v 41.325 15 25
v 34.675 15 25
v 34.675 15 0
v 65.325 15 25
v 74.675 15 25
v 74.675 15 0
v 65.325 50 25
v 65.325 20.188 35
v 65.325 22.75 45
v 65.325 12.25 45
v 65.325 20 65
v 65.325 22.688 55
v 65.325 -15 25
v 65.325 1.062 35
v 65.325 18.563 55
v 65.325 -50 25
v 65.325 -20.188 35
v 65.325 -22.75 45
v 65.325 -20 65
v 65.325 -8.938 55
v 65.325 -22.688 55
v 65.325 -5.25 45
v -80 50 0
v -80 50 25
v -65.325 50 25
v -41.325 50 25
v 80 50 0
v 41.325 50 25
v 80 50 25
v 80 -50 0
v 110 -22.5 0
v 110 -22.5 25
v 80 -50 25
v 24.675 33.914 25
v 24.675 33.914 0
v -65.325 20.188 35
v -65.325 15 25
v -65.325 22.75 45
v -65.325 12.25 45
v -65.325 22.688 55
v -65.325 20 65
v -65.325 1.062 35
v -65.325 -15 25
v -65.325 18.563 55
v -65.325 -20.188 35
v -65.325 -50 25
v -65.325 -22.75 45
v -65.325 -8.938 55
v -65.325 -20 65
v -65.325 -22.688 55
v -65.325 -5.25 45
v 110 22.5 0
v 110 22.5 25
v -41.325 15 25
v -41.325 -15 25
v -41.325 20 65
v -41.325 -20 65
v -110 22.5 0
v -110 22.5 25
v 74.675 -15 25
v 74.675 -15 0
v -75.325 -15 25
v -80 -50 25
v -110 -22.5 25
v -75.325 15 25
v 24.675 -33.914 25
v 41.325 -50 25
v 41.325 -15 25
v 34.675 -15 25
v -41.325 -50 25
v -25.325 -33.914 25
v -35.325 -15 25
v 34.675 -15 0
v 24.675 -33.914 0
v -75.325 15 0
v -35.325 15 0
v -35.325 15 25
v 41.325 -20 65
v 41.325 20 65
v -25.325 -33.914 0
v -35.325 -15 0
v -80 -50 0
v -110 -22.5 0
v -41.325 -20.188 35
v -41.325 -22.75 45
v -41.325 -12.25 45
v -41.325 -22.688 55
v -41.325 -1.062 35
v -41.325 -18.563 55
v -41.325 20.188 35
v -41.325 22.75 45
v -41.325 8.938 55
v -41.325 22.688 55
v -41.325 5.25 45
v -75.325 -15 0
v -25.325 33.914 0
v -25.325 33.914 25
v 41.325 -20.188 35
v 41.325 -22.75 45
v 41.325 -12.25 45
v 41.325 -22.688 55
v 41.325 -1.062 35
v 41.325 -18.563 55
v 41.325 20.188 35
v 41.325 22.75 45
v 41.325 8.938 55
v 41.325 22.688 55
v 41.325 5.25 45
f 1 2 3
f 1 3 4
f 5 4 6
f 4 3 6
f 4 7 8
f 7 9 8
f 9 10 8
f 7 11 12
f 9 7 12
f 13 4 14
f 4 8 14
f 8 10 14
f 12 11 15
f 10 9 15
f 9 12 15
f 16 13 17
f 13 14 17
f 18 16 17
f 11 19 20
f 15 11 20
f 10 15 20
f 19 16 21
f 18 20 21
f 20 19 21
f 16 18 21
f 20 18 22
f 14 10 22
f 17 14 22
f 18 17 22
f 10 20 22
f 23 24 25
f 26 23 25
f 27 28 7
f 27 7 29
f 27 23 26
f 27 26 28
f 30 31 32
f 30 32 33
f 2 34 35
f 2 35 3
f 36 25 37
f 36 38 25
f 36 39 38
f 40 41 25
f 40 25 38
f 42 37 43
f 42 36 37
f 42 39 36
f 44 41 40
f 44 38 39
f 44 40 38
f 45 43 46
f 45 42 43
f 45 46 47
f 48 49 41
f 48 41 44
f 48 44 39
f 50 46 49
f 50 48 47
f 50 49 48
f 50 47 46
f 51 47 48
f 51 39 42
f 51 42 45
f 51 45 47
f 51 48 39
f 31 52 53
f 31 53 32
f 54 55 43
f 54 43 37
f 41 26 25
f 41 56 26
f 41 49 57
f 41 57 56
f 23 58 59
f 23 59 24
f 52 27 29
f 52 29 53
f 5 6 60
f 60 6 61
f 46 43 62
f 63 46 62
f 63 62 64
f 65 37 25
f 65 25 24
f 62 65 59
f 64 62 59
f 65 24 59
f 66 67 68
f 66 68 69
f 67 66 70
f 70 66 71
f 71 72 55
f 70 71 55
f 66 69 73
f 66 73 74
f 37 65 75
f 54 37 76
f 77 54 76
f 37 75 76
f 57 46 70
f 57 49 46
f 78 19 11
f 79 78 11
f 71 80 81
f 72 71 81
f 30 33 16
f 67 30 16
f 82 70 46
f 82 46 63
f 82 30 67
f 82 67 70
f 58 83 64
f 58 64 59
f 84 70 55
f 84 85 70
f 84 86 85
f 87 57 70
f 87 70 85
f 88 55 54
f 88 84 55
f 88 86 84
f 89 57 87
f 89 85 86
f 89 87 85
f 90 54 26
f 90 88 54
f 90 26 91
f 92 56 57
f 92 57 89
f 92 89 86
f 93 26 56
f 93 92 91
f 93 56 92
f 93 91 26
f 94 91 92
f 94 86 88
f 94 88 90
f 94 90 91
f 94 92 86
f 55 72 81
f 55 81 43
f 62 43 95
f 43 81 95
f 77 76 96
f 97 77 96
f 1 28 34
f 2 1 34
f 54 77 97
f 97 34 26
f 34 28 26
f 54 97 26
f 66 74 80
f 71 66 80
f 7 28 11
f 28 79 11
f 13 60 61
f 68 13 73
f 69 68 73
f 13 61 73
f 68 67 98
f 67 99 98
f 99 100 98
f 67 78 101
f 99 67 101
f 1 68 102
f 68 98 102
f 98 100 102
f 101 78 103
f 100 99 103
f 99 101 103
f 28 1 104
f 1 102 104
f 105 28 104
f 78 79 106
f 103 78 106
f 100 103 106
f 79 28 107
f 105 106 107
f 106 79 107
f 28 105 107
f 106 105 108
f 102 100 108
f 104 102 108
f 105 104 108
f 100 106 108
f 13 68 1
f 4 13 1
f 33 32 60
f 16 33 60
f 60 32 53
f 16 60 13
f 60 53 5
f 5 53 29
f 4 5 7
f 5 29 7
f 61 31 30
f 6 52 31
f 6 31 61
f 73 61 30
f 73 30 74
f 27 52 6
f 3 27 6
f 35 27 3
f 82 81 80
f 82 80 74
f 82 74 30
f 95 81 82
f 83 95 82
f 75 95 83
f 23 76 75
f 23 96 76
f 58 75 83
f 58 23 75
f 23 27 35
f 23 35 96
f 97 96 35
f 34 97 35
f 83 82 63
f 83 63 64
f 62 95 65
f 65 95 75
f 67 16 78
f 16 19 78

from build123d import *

# Parameters (mm, degrees)
EXTRUDE1_DEPTH = 25


with BuildPart() as part:
    # Sketch1 → Extrude1 (new body)
    with BuildSketch(Plane.XY):
        Polygon((110, 22.5), (110, -22.5), (80, -50), (-80, -50), (-110, -22.5), (-110, 22.5), (-80, 50), (80, 50), align=None)
        Polygon((-75.325078699, 15), (-35.325078699, 15), (-25.325078699, 33.914218403), (24.674921301, 33.914218403), (34.674921301, 15), (74.674921301, 15), (74.674921301, -15), (34.674921301, -15), (24.674921301, -33.914218403), (-25.325078699, -33.914218403), (-35.325078699, -15), (-75.325078699, -15), align=None, mode=Mode.SUBTRACT)
    extrude(amount=EXTRUDE1_DEPTH)

    # Sketch3 → Loft1 section 0
    with BuildSketch(Plane.XY.offset(25)):
        with BuildLine():
            Line((-65.325078699, -50), (-41.325078699, -50))
            Line((-41.325078699, -50), (-41.325078699, 50))
            Line((-41.325078699, 50), (-65.325078699, 50))
            Line((-65.325078699, 50), (-65.325078699, -50))
        make_face()
    # Sketch2 → Loft1 section 1
    with BuildSketch(Plane.XY.offset(65)):
        with BuildLine():
            Line((-65.325078699, 20), (-41.325078699, 20))
            Line((-41.325078699, 20), (-41.325078699, -20))
            Line((-41.325078699, -20), (-65.325078699, -20))
            Line((-65.325078699, -20), (-65.325078699, 20))
        make_face()
    loft1 = loft()

    # Mirror1: Loft1 across plane
    add(loft1.mirror(Plane(origin=(0, 0, 0), x_dir=(0, 0, 1), z_dir=(1, 0, 0))))


solid = part.part
